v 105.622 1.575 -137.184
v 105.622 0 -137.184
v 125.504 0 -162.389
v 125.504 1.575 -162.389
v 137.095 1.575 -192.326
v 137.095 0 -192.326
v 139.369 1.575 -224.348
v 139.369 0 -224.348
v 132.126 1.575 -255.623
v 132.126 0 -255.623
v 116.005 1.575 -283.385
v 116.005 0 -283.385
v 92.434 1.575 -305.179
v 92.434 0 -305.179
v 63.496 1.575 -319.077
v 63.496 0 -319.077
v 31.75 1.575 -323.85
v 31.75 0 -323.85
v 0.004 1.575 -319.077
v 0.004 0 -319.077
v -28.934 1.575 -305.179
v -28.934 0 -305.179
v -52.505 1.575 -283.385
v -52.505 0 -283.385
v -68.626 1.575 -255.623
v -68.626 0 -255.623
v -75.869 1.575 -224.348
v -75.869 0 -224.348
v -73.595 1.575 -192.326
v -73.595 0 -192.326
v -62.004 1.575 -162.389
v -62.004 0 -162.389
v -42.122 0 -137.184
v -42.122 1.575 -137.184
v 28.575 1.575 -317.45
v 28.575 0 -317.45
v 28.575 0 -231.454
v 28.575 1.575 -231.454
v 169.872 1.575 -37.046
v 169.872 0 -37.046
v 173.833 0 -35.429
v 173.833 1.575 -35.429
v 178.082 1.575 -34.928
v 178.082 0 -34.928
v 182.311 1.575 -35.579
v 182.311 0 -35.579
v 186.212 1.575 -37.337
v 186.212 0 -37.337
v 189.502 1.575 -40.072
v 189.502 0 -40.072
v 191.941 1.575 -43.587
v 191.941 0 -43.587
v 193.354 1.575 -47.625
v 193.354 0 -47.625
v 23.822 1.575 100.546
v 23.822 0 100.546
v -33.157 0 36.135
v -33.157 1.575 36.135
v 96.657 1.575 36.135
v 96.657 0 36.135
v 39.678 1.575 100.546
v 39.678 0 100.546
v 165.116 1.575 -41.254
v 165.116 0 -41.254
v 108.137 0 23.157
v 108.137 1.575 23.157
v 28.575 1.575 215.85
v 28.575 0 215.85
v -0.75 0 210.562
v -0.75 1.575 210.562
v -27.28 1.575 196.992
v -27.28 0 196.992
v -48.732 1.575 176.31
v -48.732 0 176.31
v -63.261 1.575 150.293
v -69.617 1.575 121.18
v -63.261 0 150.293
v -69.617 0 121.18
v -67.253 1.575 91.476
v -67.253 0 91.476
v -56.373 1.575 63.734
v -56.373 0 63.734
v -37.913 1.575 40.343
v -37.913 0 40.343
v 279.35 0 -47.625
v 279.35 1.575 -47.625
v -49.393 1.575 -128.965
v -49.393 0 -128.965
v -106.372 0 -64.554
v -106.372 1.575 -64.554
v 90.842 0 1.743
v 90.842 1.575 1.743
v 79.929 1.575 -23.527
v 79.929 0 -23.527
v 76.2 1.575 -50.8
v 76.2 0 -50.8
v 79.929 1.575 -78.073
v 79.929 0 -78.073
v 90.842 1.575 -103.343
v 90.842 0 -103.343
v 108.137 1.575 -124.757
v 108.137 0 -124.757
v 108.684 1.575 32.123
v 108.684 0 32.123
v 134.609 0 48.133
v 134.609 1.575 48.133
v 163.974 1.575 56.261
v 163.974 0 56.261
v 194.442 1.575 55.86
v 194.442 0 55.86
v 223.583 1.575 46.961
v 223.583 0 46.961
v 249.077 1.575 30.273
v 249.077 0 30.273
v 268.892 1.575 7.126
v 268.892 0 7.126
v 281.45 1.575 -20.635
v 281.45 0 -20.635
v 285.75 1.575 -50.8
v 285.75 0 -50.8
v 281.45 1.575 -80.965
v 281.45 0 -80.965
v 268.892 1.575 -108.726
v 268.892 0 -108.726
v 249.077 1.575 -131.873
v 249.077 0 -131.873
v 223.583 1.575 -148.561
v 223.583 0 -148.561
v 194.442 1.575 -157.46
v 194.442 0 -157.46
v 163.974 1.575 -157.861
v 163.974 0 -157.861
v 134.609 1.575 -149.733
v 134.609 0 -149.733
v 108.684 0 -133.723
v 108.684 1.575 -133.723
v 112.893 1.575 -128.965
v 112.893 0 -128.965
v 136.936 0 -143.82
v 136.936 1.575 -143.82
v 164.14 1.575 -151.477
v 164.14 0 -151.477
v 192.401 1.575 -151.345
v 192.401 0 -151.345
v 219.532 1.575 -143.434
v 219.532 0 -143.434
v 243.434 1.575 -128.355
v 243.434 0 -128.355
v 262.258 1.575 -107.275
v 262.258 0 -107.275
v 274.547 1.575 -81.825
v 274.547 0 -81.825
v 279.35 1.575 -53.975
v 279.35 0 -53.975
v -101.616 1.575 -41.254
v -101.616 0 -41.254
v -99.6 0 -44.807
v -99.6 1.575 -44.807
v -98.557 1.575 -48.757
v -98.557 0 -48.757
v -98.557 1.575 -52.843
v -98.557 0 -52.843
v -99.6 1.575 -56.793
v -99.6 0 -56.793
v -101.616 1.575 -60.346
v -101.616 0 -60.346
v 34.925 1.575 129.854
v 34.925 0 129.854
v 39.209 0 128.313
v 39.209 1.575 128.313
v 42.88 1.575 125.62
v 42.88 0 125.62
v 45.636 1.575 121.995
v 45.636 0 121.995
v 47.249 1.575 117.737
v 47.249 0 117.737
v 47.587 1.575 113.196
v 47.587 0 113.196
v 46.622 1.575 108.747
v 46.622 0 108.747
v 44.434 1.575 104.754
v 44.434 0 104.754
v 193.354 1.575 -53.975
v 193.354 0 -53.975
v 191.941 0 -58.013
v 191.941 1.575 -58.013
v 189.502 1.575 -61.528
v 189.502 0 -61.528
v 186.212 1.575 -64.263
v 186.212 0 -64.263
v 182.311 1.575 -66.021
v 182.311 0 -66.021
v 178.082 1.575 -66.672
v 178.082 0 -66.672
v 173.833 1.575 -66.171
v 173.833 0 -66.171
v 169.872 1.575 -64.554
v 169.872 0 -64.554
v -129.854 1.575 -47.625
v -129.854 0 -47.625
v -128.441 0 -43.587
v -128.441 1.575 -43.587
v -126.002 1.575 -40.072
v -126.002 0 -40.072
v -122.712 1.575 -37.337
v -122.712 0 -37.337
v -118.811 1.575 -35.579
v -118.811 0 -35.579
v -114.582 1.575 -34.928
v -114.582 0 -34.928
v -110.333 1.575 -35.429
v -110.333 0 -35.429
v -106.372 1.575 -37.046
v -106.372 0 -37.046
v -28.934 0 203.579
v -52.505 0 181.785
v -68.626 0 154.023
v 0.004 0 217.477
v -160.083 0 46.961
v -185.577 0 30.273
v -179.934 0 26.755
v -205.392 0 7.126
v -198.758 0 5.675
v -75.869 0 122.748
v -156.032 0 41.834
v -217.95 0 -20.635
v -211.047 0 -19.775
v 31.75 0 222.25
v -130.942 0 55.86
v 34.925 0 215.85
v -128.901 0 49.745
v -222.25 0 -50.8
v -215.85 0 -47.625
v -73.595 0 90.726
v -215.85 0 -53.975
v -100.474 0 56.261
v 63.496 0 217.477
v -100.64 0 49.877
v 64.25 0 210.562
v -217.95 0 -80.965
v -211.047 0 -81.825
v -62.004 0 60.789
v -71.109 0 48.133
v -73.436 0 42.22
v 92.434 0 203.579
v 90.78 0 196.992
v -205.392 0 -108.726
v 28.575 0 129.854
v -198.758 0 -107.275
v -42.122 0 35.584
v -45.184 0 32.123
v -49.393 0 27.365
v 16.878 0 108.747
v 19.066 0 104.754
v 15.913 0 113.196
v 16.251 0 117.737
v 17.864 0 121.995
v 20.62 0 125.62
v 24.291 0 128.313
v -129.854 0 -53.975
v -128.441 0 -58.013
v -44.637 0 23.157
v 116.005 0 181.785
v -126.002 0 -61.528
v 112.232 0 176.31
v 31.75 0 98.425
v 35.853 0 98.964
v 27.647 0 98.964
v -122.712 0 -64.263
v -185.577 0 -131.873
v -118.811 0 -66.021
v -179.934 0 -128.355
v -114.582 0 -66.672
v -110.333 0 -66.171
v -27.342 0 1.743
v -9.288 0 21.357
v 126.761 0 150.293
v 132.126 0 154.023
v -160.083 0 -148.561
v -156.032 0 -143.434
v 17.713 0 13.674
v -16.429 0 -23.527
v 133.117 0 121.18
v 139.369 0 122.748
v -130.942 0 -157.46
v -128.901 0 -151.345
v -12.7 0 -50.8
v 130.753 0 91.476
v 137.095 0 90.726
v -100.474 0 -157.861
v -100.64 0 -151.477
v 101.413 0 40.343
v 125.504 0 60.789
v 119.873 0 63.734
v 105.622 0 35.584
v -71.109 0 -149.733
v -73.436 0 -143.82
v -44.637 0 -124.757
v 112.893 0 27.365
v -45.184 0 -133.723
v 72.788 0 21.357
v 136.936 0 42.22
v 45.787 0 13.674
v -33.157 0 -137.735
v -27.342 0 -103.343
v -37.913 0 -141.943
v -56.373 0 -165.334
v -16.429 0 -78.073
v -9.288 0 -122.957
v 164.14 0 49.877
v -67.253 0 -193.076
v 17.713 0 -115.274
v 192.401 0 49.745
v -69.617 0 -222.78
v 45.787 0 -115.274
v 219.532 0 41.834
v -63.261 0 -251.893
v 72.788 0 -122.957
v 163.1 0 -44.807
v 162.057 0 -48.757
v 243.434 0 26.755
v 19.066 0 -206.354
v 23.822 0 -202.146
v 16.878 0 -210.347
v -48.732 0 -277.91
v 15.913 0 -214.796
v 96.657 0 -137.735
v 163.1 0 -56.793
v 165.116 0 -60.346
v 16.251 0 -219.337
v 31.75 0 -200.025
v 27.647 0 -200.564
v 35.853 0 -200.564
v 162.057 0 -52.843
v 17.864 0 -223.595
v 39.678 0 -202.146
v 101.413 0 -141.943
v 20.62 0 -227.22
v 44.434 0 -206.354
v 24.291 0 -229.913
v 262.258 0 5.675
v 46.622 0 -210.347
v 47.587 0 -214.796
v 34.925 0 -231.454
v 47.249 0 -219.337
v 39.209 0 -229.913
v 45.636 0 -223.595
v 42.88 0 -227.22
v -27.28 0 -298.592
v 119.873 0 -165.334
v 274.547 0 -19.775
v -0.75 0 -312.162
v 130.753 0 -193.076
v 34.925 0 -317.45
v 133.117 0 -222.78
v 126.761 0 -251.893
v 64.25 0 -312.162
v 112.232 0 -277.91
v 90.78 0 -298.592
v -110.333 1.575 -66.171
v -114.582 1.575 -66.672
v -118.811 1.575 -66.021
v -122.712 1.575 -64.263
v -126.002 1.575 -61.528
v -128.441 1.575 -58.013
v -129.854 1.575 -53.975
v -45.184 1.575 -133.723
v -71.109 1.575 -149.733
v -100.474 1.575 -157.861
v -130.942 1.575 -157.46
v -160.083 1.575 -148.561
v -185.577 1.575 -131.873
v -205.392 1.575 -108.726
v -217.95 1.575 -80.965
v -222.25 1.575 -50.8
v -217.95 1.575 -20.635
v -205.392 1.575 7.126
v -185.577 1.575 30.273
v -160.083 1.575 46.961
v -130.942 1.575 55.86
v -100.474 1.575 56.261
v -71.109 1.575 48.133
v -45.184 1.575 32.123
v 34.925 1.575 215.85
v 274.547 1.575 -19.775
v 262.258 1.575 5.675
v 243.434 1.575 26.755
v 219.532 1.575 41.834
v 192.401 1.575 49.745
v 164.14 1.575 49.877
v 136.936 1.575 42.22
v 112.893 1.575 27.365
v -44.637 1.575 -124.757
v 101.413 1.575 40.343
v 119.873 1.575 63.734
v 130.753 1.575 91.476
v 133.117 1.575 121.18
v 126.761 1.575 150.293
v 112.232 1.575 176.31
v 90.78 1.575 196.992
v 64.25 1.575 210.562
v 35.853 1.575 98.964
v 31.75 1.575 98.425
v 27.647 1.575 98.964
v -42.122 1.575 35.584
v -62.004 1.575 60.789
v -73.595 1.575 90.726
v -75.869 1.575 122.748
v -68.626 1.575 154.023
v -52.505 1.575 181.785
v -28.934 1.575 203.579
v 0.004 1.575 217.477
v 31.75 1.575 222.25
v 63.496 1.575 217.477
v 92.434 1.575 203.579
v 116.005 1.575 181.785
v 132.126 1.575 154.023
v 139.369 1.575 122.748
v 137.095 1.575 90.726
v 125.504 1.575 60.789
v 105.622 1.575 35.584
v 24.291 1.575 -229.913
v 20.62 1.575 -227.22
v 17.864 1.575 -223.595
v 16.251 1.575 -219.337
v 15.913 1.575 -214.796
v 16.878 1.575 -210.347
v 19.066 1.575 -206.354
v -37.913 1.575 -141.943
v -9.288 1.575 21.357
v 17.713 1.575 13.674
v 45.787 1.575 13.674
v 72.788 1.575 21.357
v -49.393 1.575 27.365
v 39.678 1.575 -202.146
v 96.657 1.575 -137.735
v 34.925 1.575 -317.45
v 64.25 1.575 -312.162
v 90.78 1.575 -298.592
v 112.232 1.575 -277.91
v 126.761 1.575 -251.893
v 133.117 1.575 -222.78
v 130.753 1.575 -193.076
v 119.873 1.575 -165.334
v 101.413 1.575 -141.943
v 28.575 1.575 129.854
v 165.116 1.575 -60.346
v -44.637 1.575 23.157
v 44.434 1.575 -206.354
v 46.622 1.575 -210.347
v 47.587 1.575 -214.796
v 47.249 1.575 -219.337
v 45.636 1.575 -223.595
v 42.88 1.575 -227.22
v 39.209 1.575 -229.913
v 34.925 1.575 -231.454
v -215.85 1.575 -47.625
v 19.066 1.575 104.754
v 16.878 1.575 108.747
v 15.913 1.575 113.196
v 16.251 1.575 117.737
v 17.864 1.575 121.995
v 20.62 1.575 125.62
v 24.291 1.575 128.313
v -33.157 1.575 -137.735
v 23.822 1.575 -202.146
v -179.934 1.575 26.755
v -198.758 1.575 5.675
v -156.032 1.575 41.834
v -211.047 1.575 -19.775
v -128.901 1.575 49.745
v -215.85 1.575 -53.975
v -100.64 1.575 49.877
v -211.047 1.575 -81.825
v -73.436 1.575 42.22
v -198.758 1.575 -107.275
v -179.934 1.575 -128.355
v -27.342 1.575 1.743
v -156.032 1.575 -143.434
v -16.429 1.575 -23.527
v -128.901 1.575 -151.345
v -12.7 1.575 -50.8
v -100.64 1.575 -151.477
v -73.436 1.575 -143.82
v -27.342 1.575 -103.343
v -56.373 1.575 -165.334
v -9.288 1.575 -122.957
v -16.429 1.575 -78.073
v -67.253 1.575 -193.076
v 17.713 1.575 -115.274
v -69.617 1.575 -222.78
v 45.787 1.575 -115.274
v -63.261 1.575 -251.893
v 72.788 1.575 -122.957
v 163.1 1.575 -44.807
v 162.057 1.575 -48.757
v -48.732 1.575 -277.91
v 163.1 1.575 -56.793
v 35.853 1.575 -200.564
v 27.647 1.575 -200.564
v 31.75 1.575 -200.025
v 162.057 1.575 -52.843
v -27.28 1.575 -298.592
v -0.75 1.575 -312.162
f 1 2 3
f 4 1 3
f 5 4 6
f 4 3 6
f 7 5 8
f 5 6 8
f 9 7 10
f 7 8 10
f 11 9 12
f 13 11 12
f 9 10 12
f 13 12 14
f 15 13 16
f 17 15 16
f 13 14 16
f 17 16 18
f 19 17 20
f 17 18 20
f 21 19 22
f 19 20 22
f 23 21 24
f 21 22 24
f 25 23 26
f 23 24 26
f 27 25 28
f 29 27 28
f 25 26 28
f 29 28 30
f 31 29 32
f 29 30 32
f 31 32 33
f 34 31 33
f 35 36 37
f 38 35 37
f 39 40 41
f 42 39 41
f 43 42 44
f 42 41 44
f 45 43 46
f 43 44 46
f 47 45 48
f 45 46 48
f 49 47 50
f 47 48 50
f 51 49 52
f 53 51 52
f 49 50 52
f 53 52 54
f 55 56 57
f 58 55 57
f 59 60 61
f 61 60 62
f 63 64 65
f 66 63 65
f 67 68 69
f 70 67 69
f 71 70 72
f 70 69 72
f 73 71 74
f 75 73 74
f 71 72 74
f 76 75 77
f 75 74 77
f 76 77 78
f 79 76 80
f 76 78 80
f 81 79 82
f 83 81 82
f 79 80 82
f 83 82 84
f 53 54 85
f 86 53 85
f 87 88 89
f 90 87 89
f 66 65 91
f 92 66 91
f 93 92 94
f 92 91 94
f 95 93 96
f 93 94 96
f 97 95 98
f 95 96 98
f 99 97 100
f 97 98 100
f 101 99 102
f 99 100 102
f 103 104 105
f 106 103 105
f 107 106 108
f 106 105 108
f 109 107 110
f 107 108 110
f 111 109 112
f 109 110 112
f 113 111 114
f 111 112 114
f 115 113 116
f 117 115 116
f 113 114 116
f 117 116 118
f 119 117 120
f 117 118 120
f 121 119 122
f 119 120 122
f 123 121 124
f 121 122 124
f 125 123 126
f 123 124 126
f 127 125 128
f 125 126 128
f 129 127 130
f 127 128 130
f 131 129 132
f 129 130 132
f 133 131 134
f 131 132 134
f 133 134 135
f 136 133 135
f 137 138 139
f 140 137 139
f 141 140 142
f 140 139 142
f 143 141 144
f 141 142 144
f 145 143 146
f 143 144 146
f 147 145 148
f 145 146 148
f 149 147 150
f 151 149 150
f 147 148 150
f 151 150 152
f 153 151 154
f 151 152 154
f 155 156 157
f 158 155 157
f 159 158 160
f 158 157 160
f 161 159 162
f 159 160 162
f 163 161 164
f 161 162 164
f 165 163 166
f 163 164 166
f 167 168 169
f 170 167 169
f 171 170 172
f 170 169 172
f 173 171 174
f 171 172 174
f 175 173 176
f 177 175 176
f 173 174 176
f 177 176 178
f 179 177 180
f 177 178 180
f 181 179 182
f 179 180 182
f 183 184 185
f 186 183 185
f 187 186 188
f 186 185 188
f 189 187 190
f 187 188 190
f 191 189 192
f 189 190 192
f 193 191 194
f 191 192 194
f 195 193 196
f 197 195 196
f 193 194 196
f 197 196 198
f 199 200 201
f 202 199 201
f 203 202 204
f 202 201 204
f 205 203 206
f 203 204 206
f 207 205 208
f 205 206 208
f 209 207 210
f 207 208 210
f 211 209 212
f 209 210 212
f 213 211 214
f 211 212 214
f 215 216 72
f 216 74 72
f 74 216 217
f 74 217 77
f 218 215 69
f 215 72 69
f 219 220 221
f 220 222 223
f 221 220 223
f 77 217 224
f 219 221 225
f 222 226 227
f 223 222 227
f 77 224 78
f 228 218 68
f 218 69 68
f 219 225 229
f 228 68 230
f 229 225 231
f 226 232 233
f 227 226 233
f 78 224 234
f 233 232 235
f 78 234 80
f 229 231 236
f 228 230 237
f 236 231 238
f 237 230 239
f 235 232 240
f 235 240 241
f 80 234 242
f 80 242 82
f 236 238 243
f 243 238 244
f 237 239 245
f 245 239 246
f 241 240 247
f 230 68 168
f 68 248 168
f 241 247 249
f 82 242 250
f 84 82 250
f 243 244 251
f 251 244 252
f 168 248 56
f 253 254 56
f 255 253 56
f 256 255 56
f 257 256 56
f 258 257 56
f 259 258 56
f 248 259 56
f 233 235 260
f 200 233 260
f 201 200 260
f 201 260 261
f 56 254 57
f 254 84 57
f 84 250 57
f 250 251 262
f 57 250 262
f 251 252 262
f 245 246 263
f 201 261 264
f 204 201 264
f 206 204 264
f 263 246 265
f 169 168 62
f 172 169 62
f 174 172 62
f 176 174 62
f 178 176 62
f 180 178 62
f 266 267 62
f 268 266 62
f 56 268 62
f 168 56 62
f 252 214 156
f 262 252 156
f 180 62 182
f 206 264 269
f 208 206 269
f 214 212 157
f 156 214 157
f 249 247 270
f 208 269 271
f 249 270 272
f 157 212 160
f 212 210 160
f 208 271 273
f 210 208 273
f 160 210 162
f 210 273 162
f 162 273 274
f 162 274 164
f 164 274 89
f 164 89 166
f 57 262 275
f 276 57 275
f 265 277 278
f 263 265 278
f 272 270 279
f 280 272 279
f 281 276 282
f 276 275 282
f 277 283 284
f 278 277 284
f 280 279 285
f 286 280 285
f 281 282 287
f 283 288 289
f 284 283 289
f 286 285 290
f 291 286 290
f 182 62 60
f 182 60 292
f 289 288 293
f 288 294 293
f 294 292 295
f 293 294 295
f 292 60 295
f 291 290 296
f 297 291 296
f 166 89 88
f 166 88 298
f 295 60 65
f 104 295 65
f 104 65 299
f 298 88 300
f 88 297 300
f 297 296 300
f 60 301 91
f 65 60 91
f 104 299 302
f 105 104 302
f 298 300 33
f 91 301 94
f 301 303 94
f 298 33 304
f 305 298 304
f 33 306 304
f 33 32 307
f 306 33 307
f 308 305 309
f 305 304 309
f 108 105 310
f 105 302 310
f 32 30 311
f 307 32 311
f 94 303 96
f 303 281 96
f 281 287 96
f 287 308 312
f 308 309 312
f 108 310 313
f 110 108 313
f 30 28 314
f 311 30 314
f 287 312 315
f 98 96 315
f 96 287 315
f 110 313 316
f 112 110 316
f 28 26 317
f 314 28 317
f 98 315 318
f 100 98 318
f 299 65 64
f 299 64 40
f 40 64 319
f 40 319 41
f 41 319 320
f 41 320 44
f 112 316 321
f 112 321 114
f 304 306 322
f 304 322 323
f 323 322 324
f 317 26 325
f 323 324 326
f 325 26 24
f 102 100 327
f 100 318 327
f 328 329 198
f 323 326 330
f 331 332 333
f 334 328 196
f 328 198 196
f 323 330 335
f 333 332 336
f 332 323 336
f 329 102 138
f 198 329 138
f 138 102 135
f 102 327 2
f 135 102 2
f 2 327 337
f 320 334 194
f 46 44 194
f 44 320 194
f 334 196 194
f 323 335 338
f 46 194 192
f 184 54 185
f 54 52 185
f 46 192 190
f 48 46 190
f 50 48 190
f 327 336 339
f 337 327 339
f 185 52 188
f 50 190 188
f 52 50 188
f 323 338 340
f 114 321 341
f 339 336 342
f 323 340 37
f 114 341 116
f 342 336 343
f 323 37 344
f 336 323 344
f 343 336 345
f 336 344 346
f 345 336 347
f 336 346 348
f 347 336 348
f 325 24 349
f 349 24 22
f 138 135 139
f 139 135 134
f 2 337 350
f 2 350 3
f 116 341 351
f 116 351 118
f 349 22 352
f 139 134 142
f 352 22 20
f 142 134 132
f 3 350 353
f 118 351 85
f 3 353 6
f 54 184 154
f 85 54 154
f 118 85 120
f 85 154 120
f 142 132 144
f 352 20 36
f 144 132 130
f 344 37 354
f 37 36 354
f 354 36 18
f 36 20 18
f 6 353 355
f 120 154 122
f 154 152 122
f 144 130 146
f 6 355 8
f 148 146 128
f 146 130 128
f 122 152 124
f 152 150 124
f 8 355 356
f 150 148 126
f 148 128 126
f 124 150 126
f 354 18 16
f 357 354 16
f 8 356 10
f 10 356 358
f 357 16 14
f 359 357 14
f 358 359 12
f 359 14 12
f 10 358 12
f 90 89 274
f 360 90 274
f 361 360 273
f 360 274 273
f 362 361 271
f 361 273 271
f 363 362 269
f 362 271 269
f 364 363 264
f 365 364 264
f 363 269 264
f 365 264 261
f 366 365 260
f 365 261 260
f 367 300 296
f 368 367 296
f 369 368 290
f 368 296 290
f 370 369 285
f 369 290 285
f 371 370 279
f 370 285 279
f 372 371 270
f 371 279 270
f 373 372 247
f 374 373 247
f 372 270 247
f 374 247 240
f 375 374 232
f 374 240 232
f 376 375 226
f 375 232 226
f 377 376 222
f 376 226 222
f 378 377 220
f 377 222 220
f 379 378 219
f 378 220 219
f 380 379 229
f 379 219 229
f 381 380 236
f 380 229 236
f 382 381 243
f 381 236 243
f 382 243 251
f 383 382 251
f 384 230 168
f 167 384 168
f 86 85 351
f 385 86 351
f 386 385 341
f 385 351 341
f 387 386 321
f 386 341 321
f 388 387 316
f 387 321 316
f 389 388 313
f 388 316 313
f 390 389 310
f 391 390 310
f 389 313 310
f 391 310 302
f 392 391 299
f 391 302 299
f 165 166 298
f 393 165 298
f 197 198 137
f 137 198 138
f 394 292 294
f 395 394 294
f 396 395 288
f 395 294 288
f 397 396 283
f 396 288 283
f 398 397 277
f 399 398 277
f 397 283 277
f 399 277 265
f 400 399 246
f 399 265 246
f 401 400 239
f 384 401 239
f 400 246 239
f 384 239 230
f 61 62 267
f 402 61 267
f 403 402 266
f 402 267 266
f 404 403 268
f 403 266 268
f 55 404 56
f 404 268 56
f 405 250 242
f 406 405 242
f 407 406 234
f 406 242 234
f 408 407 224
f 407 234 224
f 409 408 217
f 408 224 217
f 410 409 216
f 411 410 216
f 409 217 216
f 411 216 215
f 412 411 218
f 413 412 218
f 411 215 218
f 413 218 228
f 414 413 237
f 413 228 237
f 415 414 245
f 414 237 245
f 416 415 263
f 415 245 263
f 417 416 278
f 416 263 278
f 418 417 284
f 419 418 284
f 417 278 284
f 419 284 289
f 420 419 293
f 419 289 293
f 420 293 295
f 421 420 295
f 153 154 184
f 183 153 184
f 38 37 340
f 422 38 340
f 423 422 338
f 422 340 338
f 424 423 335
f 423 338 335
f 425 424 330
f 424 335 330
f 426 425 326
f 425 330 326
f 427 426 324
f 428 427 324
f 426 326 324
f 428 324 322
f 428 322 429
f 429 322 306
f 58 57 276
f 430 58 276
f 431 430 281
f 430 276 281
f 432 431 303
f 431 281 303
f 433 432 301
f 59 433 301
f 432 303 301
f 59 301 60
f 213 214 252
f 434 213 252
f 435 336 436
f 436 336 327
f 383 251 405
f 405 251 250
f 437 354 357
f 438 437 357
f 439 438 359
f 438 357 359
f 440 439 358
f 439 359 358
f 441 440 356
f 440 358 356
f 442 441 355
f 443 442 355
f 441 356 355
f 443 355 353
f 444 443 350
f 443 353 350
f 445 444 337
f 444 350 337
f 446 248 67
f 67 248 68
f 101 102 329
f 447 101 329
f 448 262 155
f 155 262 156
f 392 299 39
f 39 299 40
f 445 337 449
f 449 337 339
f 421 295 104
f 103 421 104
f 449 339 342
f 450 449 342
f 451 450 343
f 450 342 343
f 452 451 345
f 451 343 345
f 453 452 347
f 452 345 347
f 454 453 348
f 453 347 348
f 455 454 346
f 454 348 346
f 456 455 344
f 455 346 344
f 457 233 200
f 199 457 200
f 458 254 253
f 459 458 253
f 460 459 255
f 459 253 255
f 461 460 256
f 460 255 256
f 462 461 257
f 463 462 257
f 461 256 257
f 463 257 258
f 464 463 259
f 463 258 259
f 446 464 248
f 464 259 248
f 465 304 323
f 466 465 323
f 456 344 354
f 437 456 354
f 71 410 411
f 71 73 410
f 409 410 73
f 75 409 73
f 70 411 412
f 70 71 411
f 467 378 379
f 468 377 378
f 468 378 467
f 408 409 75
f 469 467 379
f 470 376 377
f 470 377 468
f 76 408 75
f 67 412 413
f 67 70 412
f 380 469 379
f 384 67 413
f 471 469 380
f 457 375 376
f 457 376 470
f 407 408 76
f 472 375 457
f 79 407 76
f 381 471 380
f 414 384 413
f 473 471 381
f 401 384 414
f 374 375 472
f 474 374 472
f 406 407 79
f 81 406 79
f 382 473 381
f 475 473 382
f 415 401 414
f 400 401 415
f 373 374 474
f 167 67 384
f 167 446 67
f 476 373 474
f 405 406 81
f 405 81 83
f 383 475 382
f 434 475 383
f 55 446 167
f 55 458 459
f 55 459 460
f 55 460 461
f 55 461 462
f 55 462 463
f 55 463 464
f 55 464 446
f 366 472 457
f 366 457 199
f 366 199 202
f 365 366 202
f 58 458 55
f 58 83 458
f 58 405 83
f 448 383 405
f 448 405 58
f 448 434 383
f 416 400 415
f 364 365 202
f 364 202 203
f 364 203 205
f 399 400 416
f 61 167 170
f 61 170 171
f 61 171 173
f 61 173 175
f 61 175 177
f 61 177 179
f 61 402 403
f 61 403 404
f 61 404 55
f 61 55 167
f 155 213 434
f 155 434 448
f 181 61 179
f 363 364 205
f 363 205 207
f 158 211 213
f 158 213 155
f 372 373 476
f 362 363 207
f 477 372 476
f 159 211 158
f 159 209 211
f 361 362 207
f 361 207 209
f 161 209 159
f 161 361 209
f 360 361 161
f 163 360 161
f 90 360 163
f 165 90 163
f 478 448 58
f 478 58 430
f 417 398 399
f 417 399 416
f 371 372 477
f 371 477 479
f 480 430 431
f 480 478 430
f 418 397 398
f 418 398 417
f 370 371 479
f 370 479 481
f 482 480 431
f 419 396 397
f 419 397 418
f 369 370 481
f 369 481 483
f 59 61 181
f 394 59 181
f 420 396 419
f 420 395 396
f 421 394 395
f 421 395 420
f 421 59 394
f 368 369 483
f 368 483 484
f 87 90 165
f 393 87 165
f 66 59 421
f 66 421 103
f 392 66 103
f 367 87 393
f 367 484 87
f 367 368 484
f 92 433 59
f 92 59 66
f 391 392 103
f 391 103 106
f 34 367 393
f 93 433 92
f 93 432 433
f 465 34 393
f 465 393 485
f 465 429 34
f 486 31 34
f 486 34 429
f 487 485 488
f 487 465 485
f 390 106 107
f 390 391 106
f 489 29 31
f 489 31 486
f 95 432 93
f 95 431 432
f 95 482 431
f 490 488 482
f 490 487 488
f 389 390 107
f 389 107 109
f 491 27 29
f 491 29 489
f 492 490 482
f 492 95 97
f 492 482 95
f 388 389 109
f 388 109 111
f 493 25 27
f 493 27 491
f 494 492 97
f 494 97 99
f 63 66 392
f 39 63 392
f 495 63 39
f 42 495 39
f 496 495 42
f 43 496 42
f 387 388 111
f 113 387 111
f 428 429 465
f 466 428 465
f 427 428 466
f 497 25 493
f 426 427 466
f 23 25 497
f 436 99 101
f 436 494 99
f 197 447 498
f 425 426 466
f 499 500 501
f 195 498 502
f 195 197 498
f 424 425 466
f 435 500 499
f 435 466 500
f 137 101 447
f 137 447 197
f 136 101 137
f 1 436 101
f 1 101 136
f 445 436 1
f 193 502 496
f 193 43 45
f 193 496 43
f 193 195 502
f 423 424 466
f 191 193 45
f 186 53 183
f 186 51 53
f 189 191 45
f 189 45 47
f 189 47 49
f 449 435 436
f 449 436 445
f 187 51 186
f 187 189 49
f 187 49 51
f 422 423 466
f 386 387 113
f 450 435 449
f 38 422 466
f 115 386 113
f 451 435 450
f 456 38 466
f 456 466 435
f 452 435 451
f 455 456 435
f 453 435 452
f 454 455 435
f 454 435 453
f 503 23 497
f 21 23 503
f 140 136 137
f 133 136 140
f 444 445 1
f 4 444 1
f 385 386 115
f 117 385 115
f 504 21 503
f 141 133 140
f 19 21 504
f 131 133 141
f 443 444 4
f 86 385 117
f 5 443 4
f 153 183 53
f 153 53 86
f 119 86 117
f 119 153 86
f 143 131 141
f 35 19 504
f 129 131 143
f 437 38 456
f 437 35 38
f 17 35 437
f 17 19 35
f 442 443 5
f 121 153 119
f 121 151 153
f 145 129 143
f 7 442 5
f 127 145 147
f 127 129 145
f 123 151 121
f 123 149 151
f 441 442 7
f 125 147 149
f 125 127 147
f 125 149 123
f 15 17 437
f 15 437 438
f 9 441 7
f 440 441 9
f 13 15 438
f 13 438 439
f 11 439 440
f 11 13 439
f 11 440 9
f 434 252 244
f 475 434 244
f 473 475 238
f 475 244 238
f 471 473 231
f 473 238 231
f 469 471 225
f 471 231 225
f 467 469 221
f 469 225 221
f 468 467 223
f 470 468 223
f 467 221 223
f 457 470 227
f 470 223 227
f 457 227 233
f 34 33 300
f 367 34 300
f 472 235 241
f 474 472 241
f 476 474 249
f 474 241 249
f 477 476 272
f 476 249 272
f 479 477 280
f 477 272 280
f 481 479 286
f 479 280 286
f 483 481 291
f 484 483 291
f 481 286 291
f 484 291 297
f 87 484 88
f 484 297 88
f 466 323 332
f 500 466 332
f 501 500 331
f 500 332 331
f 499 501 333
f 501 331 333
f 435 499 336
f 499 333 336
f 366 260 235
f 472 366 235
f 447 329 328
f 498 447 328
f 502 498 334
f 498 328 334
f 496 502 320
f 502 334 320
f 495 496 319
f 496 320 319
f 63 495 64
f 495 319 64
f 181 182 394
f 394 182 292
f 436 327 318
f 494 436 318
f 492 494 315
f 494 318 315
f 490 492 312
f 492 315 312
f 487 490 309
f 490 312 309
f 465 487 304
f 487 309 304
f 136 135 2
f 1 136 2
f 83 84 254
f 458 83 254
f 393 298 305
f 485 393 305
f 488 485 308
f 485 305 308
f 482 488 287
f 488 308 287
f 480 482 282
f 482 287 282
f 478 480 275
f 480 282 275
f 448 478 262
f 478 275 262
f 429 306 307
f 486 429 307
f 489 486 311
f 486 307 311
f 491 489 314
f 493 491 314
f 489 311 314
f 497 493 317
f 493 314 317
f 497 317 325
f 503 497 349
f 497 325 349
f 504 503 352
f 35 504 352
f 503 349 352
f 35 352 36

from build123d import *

# Parameters (mm, degrees)
BOSS_EXTRUDE2_DEPTH = 1.5748


with BuildPart() as part:
    # Sketch1 → Boss-Extrude2 (new body)
    with BuildSketch(Plane(origin=(0, 0, 0), x_dir=(1, 0, 0), z_dir=(0, 1, 0))):
        with BuildLine():
            ThreePointArc((105.621971622, 137.184472252), (31.75, 323.85), (-42.121971622, 137.184472252))
            Line((-42.121971622, 137.184472252), (-45.184156549, 133.7228719))
            ThreePointArc((-45.184156549, 133.7228719), (-222.25, 50.8), (-45.184156549, -32.1228719))
            Line((-45.184156549, -32.1228719), (-42.121971622, -35.584472252))
            ThreePointArc((-42.121971622, -35.584472252), (31.75, -222.25), (105.621971622, -35.584472252))
            Line((105.621971622, -35.584472252), (108.684156549, -32.1228719))
            ThreePointArc((108.684156549, -32.1228719), (285.75, 50.8), (108.684156549, 133.7228719))
            Line((108.684156549, 133.7228719), (105.621971622, 137.184472252))
        make_face()
        with BuildLine():
            ThreePointArc((19.066089569, -104.753584904), (16.904555213, -119.923912703), (28.575, -129.854259867))
            Line((28.575, -129.854259867), (28.575, -215.850378507))
            ThreePointArc((28.575, -215.850378507), (-63.260846634, -150.293041299), (-37.912692613, -40.342787654))
            Line((-37.912692613, -40.342787654), (19.066089569, -104.753584904))
        make_face(mode=Mode.SUBTRACT)
        with BuildLine():
            Line((-215.850378507, 47.625), (-129.854259867, 47.625))
            ThreePointArc((-129.854259867, 47.625), (-120.820607869, 36.325978513), (-106.372217741, 37.046240752))
            Line((-106.372217741, 37.046240752), (-49.393435559, -27.364556498))
            ThreePointArc((-49.393435559, -27.364556498), (-156.031890363, -41.833737519), (-215.850378507, 47.625))
        make_face(mode=Mode.SUBTRACT)
        with BuildLine():
            Line((-101.616089569, 60.346415096), (-44.637307387, 124.757212346))
            ThreePointArc((-44.637307387, 124.757212346), (-12.7, 50.8), (-44.637307387, -23.157212346))
            Line((-44.637307387, -23.157212346), (-101.616089569, 41.253584904))
            ThreePointArc((-101.616089569, 41.253584904), (-98.425, 50.8), (-101.616089569, 60.346415096))
        make_face(mode=Mode.SUBTRACT)
        with BuildLine():
            Line((44.433910431, -104.753584904), (101.412692613, -40.342787654))
            ThreePointArc((101.412692613, -40.342787654), (126.760846634, -150.293041299), (34.925, -215.850378507))
            Line((34.925, -215.850378507), (34.925, -129.854259867))
            ThreePointArc((34.925, -129.854259867), (46.595444787, -119.923912703), (44.433910431, -104.753584904))
        make_face(mode=Mode.SUBTRACT)
        with BuildLine():
            ThreePointArc((-33.156564441, -36.135443502), (31.75, -12.7), (96.656564441, -36.135443502))
            Line((96.656564441, -36.135443502), (39.677782259, -100.546240752))
            ThreePointArc((39.677782259, -100.546240752), (31.75, -98.425), (23.822217741, -100.546240752))
            Line((23.822217741, -100.546240752), (-33.156564441, -36.135443502))
        make_face(mode=Mode.SUBTRACT)
        with BuildLine():
            ThreePointArc((108.137307387, -23.157212346), (76.2, 50.8), (108.137307387, 124.757212346))
            Line((108.137307387, 124.757212346), (165.116089569, 60.346415096))
            ThreePointArc((165.116089569, 60.346415096), (161.925, 50.8), (165.116089569, 41.253584904))
            Line((165.116089569, 41.253584904), (108.137307387, -23.157212346))
        make_face(mode=Mode.SUBTRACT)
        with BuildLine():
            ThreePointArc((169.872217741, 37.046240752), (184.320607869, 36.325978513), (193.354259867, 47.625))
            Line((193.354259867, 47.625), (279.350378507, 47.625))
            ThreePointArc((279.350378507, 47.625), (219.531890363, -41.833737519), (112.893435559, -27.364556498))
            Line((112.893435559, -27.364556498), (169.872217741, 37.046240752))
        make_face(mode=Mode.SUBTRACT)
        with BuildLine():
            ThreePointArc((-215.850378507, 53.975), (-156.031890363, 143.433737519), (-49.393435559, 128.964556498))
            Line((-49.393435559, 128.964556498), (-106.372217741, 64.553759248))
            ThreePointArc((-106.372217741, 64.553759248), (-120.820607869, 65.274021487), (-129.854259867, 53.975))
            Line((-129.854259867, 53.975), (-215.850378507, 53.975))
        make_face(mode=Mode.SUBTRACT)
        with BuildLine():
            Line((28.575, 317.450378507), (28.575, 231.454259867))
            ThreePointArc((28.575, 231.454259867), (16.904555213, 221.523912703), (19.066089569, 206.353584904))
            Line((19.066089569, 206.353584904), (-37.912692613, 141.942787654))
            ThreePointArc((-37.912692613, 141.942787654), (-63.260846634, 251.893041299), (28.575, 317.450378507))
        make_face(mode=Mode.SUBTRACT)
        with BuildLine():
            Line((-33.156564441, 137.735443502), (23.822217741, 202.146240752))
            ThreePointArc((23.822217741, 202.146240752), (31.75, 200.025), (39.677782259, 202.146240752))
            Line((39.677782259, 202.146240752), (96.656564441, 137.735443502))
            ThreePointArc((96.656564441, 137.735443502), (31.75, 114.3), (-33.156564441, 137.735443502))
        make_face(mode=Mode.SUBTRACT)
        with BuildLine():
            Line((279.350378507, 53.975), (193.354259867, 53.975))
            ThreePointArc((193.354259867, 53.975), (184.320607869, 65.274021487), (169.872217741, 64.553759248))
            Line((169.872217741, 64.553759248), (112.893435559, 128.964556498))
            ThreePointArc((112.893435559, 128.964556498), (219.531890363, 143.433737519), (279.350378507, 53.975))
        make_face(mode=Mode.SUBTRACT)
        with BuildLine():
            ThreePointArc((44.433910431, 206.353584904), (46.595444787, 221.523912703), (34.925, 231.454259867))
            Line((34.925, 231.454259867), (34.925, 317.450378507))
            ThreePointArc((34.925, 317.450378507), (126.760846634, 251.893041299), (101.412692613, 141.942787654))
            Line((101.412692613, 141.942787654), (44.433910431, 206.353584904))
        make_face(mode=Mode.SUBTRACT)
    extrude(amount=BOSS_EXTRUDE2_DEPTH)


solid = part.part
